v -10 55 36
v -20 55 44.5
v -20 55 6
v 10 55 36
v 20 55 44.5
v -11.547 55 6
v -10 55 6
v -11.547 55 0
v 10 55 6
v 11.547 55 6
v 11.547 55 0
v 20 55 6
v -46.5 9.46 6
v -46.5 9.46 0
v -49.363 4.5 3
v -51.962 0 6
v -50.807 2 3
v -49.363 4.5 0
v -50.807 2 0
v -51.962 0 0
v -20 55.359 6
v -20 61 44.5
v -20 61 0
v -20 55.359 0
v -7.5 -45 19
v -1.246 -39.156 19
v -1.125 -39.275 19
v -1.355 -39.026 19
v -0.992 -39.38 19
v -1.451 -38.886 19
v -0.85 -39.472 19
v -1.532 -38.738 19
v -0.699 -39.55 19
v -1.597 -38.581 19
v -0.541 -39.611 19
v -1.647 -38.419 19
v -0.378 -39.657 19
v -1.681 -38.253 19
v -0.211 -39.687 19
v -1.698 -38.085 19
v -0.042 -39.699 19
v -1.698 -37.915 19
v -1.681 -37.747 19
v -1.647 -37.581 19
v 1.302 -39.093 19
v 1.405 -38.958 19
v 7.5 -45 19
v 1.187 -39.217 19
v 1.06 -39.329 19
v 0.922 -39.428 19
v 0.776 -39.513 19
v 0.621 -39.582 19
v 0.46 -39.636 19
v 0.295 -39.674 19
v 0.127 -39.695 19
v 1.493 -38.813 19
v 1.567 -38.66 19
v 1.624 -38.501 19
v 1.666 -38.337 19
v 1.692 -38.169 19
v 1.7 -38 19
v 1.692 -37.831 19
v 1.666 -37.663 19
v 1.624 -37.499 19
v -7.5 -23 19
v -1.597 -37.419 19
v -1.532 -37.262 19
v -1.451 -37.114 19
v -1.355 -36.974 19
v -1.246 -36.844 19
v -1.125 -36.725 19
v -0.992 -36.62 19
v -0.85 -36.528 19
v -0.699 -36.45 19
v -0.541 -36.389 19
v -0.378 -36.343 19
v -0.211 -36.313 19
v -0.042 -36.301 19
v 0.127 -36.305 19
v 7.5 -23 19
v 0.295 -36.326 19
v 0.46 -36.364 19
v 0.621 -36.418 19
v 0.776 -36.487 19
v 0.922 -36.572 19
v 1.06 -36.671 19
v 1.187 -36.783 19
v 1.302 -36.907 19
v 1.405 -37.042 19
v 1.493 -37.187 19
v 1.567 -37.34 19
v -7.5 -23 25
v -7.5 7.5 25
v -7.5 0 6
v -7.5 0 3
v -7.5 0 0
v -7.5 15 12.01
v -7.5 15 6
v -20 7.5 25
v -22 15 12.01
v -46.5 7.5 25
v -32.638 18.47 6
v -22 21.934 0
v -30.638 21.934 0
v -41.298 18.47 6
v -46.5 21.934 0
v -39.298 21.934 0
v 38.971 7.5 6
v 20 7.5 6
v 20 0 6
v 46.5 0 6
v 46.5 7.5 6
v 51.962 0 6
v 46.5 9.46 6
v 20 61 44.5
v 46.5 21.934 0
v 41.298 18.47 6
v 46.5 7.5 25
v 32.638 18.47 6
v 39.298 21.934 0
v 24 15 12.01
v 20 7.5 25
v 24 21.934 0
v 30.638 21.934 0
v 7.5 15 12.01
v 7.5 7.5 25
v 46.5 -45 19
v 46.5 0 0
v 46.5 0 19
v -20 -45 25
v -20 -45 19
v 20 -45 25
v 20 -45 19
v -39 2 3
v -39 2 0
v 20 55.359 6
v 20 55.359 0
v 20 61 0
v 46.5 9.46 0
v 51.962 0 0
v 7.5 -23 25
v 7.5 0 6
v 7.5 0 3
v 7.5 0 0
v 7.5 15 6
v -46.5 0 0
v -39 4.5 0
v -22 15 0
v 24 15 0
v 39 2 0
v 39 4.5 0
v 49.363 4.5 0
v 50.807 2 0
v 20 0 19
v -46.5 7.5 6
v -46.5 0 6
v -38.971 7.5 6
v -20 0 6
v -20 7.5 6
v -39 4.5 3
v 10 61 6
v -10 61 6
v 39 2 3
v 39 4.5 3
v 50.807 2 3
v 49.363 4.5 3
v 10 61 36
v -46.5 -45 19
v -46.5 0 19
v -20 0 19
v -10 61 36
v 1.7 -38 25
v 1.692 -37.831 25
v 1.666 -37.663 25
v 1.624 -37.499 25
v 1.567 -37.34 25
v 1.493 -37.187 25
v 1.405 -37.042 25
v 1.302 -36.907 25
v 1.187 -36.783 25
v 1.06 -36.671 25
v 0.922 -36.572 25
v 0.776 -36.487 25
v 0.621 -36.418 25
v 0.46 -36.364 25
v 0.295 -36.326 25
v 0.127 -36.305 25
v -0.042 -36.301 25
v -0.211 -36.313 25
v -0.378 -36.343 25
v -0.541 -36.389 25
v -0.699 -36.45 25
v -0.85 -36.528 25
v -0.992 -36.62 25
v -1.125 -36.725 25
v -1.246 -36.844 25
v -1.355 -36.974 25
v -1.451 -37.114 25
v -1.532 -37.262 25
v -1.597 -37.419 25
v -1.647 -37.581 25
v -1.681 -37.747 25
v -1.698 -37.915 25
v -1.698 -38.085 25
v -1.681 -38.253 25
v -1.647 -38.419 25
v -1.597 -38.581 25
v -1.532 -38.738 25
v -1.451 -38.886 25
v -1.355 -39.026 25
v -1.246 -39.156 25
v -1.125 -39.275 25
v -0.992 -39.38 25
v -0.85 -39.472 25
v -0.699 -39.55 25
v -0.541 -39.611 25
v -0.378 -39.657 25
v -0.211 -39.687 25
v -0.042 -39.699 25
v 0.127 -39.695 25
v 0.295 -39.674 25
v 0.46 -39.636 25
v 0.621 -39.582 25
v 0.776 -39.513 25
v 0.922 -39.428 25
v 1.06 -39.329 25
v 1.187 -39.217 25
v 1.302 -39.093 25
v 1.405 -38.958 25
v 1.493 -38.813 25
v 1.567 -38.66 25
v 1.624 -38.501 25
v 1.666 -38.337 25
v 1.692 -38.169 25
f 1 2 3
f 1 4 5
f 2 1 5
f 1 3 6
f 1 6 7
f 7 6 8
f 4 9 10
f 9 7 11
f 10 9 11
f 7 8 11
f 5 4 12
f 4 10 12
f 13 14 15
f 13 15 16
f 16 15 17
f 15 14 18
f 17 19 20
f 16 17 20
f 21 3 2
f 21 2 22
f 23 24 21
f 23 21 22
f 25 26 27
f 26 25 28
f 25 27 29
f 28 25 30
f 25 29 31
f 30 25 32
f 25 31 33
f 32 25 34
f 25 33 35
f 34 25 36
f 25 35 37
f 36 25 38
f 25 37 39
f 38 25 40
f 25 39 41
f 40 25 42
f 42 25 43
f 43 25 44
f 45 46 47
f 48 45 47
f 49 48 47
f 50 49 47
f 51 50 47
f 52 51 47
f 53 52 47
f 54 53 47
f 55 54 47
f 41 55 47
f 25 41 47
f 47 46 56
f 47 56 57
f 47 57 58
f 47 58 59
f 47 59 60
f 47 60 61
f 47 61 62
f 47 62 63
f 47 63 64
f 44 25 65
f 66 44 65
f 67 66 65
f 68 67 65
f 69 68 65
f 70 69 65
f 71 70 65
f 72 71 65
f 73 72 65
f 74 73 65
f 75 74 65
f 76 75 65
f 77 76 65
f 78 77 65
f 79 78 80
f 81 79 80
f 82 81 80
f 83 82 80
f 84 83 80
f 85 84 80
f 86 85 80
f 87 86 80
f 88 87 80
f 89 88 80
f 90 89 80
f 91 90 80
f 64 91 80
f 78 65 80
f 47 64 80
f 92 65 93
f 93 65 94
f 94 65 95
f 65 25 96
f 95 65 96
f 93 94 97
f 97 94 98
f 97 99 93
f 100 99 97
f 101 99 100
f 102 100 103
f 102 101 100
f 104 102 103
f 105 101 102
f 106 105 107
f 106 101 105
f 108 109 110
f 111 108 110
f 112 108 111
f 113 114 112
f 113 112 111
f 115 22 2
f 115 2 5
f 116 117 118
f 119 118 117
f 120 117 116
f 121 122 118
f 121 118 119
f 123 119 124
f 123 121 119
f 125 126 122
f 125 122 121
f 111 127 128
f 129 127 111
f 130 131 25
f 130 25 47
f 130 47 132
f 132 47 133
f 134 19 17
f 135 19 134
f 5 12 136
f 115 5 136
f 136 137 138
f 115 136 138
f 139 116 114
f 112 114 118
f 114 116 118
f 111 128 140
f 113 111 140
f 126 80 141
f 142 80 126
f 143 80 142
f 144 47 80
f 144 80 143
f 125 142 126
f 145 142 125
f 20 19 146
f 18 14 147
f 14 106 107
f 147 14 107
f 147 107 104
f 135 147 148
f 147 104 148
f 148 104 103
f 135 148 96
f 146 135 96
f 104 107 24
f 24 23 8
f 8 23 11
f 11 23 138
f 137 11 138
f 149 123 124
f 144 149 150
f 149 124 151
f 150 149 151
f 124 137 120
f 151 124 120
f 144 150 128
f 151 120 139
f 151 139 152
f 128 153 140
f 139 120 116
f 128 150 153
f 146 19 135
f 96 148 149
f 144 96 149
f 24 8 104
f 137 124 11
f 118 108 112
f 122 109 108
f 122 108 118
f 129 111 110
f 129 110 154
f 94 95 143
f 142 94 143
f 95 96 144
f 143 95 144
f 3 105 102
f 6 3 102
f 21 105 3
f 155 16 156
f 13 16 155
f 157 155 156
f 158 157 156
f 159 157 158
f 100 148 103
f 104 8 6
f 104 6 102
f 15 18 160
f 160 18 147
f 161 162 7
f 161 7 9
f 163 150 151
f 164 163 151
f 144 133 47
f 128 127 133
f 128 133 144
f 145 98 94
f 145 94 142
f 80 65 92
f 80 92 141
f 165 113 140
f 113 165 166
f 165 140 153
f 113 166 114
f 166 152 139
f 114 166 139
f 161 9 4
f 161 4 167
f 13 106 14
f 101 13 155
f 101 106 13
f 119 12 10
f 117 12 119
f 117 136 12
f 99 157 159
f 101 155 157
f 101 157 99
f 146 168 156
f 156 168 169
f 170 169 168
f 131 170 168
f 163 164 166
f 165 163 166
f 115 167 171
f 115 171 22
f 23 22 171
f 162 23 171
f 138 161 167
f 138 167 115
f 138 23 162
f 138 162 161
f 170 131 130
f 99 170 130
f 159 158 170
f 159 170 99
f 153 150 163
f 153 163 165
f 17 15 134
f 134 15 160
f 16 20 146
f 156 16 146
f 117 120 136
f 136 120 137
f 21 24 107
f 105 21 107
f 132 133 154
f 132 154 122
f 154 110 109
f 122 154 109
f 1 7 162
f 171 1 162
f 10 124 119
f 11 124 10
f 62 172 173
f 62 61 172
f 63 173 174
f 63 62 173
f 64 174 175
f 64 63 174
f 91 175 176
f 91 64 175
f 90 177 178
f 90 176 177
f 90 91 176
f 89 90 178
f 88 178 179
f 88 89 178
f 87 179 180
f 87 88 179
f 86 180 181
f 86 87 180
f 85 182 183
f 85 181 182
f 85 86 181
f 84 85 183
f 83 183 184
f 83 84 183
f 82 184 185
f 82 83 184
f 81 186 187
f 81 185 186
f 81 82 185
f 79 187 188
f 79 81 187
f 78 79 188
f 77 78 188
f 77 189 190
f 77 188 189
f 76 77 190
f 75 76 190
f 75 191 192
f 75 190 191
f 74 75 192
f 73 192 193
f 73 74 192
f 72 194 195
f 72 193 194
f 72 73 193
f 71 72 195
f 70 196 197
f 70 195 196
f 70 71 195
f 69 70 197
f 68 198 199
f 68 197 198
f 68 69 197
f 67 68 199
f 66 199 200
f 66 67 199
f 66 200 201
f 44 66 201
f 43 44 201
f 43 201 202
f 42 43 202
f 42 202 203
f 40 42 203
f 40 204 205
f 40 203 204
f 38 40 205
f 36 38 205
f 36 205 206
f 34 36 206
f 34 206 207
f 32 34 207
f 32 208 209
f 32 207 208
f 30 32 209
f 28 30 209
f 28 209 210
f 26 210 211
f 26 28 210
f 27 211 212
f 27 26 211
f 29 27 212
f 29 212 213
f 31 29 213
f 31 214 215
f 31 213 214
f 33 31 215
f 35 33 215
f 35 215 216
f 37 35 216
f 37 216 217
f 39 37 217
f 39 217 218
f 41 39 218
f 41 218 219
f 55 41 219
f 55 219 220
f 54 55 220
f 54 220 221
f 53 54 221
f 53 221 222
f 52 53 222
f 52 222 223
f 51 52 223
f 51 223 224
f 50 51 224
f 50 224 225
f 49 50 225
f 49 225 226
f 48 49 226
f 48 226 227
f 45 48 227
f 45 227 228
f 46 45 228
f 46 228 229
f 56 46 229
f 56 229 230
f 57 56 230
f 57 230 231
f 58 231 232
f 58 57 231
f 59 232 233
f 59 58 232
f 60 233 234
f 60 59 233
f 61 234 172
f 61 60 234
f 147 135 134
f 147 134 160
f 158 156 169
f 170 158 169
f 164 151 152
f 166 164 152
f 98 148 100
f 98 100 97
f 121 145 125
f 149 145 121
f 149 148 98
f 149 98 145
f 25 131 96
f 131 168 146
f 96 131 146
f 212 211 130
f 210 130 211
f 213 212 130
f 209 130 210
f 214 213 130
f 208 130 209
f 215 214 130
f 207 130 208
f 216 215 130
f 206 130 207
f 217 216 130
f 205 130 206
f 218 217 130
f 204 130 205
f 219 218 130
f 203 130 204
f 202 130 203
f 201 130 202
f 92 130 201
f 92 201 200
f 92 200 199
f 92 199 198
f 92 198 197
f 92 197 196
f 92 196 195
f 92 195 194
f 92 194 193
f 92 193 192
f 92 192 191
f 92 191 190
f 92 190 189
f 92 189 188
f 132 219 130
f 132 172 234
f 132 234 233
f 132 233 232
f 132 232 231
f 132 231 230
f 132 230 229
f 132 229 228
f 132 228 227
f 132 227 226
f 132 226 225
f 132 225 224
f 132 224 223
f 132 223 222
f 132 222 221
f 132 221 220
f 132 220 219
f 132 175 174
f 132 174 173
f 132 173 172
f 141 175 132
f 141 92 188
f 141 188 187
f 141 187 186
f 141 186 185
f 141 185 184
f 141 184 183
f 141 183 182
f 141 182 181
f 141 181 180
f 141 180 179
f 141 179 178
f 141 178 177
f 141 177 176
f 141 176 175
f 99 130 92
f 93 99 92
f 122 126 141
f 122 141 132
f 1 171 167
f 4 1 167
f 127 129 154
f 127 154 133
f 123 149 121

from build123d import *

# Parameters (mm, degrees)
BOX031_W                 = 46
BOX031_H                 = 15
BOX031_DEPTH             = 16
BOX029_W                 = 78
BOX029_H                 = 15
BOX029_DEPTH             = 6
BOX023_W                 = 220
BOX023_H                 = 2.5
BOX023_DEPTH             = 3
EXTRUDE011_DEPTH         = 10
BOX024_W                 = 220
BOX024_H                 = 113
BOX024_DEPTH             = 8
BOX026_W                 = 32
BOX026_H                 = 6
BOX026_DEPTH             = 6
PRISM004_DEPTH           = 6
PRISM004_PLACEMENT_ANGLE = 30
PRISM005_DEPTH           = 6
PRISM005_PLACEMENT_ANGLE = 30
EXTRUDE012_DEPTH         = 39
EXTRUDE009_DEPTH         = 39
EXTRUDE008_DEPTH         = 39
BOX009_W                 = 12.5
BOX009_H                 = 7.5
BOX009_DEPTH             = 22
BOX010_W                 = 12.5
BOX010_H                 = 7.5
BOX010_DEPTH             = 22
CYLINDER_R               = 1.7
CYLINDER_DEPTH           = 30
BOX007_W                 = 15
BOX007_H                 = 70
BOX007_DEPTH             = 6
BOX006_W                 = 40
BOX006_H                 = 51
BOX006_DEPTH             = 6
EXTRUDE010_DEPTH         = 39
BOX021_W                 = 12.5
BOX021_H                 = 7.5
BOX021_DEPTH             = 22
BOX027_W                 = 12.5
BOX027_H                 = 7.5
BOX027_DEPTH             = 22
CYLINDER002_R            = 1.7
CYLINDER002_DEPTH        = 30
BOX025_W                 = 15
BOX025_H                 = 70
BOX025_DEPTH             = 6
BOX022_W                 = 40
BOX022_H                 = 51
BOX022_DEPTH             = 6
BOX005_W                 = 20
BOX005_H                 = 6
BOX005_DEPTH             = 30
BOX004_W                 = 40
BOX004_H                 = 6
BOX004_DEPTH             = 44.5


with BuildPart() as cube030:
    # Box031 → Box031 (new body)
    with BuildSketch(Plane(origin=(-22, 15, 0), x_dir=(1, 0, 0), z_dir=(0, 0, 1))):
        with Locations((23, 7.5)):
            Rectangle(BOX031_W, BOX031_H)
    extrude(amount=BOX031_DEPTH)


with BuildPart() as cube028:
    # Box029 → Box029 (new body)
    with BuildSketch(Plane(origin=(-39, 0, 0), x_dir=(1, 0, 0), z_dir=(0, 0, 1))):
        with Locations((39, 7.5)):
            Rectangle(BOX029_W, BOX029_H)
    extrude(amount=BOX029_DEPTH)


with BuildPart() as cube022:
    # Box023 → Box023 (new body)
    with BuildSketch(Plane(origin=(-110, 2, 0), x_dir=(1, 0, 0), z_dir=(0, 0, 1))):
        with Locations((110, 1.25)):
            Rectangle(BOX023_W, BOX023_H)
    extrude(amount=BOX023_DEPTH)


with BuildPart() as extrude011:
    # Sketch009 → Extrude011 (new body)
    with BuildSketch(Plane.XY):
        Polygon((-95, 0), (95, 0), (85, 61), (-85, 61), align=None)
    extrude(amount=EXTRUDE011_DEPTH)


with BuildPart() as molde_cortador002:
    # Box024 → Box024 (new body)
    with BuildSketch(Plane(origin=(-110, -15, 0), x_dir=(1, 0, 0), z_dir=(0, 0, 1))):
        with Locations((110, 56.5)):
            Rectangle(BOX024_W, BOX024_H)
    extrude(amount=BOX024_DEPTH)

    # Cut004020: cut Extrude011
    add(extrude011.part, mode=Mode.SUBTRACT)


with BuildPart() as cube025:
    # Box026 → Box026 (new body)
    with BuildSketch(Plane(origin=(-16, 55, 0), x_dir=(1, 0, 0), z_dir=(0, 0, 1))):
        with Locations((16, 3)):
            Rectangle(BOX026_W, BOX026_H)
    extrude(amount=BOX026_DEPTH)


with BuildPart() as prism004:
    # Prism004 → Prism004 (new body)
    with BuildSketch(Plane.XY):
        Polygon((45, 0), (-22.5, 38.971143), (-22.5, -38.971143), align=None)
    extrude(amount=PRISM004_DEPTH)


with BuildPart() as prism004_1:
    # Prism004 placement: moved
    add(prism004.part.moved(Location((0, 23, 0))).rotate(Axis((0, 23, 0), (0, 0, -1)), PRISM004_PLACEMENT_ANGLE))


with BuildPart() as base_triangulo_con_canaleta001:
    # Prism005 → Prism005 (new body)
    with BuildSketch(Plane.XY):
        Polygon((60, 0), (-30, 51.961524), (-30, -51.961524), align=None)
    extrude(amount=PRISM005_DEPTH)


with BuildPart() as base_triangulo_con_canaleta001_1:
    # Prism005 placement: moved
    add(base_triangulo_con_canaleta001.part.moved(Location((0, 23, 0))).rotate(Axis((0, 23, 0), (0, 0, -1)), PRISM005_PLACEMENT_ANGLE))

    # Cut004019: cut Prism004
    add(prism004_1.part, mode=Mode.SUBTRACT)


with BuildPart() as base_triangulo_con_canaleta001_2:
    # Cut004019 placement: moved
    add(base_triangulo_con_canaleta001_1.part.moved(Location((0, 7, 0))))

    # Fusion004005: union Cube025
    add(cube025.part)

    # Cut004015: cut molde_cortador002
    add(molde_cortador002.part, mode=Mode.SUBTRACT)

    # Cut004016: cut Cube022
    add(cube022.part, mode=Mode.SUBTRACT)


with BuildPart() as extrude012:
    # Sketch010 (on Face21 of Fusion004006) → Extrude012 (new body)
    with BuildSketch(Plane(origin=(-20, 0, 0), x_dir=(0, -1, 0), z_dir=(-1, 0, 0))):
        Polygon((-7.5, 0), (-7.5, 25), (-21.933757, 0), align=None)
    extrude(amount=-EXTRUDE012_DEPTH)


with BuildPart() as extrude012_1:
    # Extrude012 placement: moved
    add(extrude012.part.moved(Location((27.5, 0, 0))))


with BuildPart() as extrude009:
    # Sketch007 (on Face17 of Fusion004002) → Extrude009 (new body)
    with BuildSketch(Plane(origin=(-20, 0, 0), x_dir=(0, -1, 0), z_dir=(-1, 0, 0))):
        Polygon((0, 0), (0, 19), (45, 19), align=None)
    extrude(amount=EXTRUDE009_DEPTH)


with BuildPart() as extrude009_1:
    # Extrude009 placement: moved
    add(extrude009.part.moved(Location((66.5, 0, 0))))


with BuildPart() as extrude008:
    # Sketch007 (on Face17 of Fusion004002) → Extrude008 (new body)
    with BuildSketch(Plane(origin=(-20, 0, 0), x_dir=(0, -1, 0), z_dir=(-1, 0, 0))):
        Polygon((0, 0), (0, 19), (45, 19), align=None)
    extrude(amount=-EXTRUDE008_DEPTH)


with BuildPart() as extrude008_1:
    # Extrude008 placement: moved
    add(extrude008.part.moved(Location((-26.5, 0, 0))))


with BuildPart() as cube008:
    # Box009 → Box009 (new body)
    with BuildSketch(Plane(origin=(7.5, 0, 3), x_dir=(1, 0, 0), z_dir=(0, 0, 1))):
        with Locations((6.25, 3.75)):
            Rectangle(BOX009_W, BOX009_H)
    extrude(amount=BOX009_DEPTH)


with BuildPart() as cube009:
    # Box010 → Box010 (new body)
    with BuildSketch(Plane(origin=(-20, 0, 3), x_dir=(1, 0, 0), z_dir=(0, 0, 1))):
        with Locations((6.25, 3.75)):
            Rectangle(BOX010_W, BOX010_H)
    extrude(amount=BOX010_DEPTH)


with BuildPart() as cylinder:
    # Cylinder → Cylinder (new body)
    with BuildSketch(Plane(origin=(0, 7, 0), x_dir=(1, 0, 0), z_dir=(0, 0, 1))):
        Circle(CYLINDER_R)
    extrude(amount=CYLINDER_DEPTH)


with BuildPart() as cube007:
    # Box007 → Box007 (new body)
    with BuildSketch(Plane(origin=(12.5, 22, 20), x_dir=(1, 0, 0), z_dir=(0, 0, 1))):
        with Locations((7.5, 35)):
            Rectangle(BOX007_W, BOX007_H)
    extrude(amount=BOX007_DEPTH)


with BuildPart() as fusion004002:
    # Box006 → Box006 (new body)
    with BuildSketch(Plane.XY.offset(20)):
        with Locations((20, 25.5)):
            Rectangle(BOX006_W, BOX006_H)
    extrude(amount=BOX006_DEPTH)

    # Cut004005: cut Cube007
    add(cube007.part, mode=Mode.SUBTRACT)


with BuildPart() as fusion004002_1:
    # Cut004005 placement: moved
    add(fusion004002.part.moved(Location((-20, 0, -1))))

    # Cut004006: cut Cylinder
    add(cylinder.part, mode=Mode.SUBTRACT)


with BuildPart() as fusion004002_2:
    # Cut004006 placement: moved
    add(fusion004002_1.part.moved(Location((0, -45, 0))))

    # Fusion004002: union Cube008, Cube009
    add(cube008.part)
    add(cube009.part)


with BuildPart() as fusion004007:
    # Sketch008 (on Face21 of Fusion004002) → Extrude010 (new body)
    with BuildSketch(Plane(origin=(-20, 0, 0), x_dir=(0, -1, 0), z_dir=(-1, 0, 0))):
        Polygon((-7.5, 0), (-7.5, 25), (-21.933757, 0), align=None)
    extrude(amount=-EXTRUDE010_DEPTH)


with BuildPart() as fusion004007_1:
    # Extrude010 placement: moved
    add(fusion004007.part.moved(Location((-26.5, 0, 0))))

    # Fusion004007: union Extrude012, Extrude009, Extrude008, Fusion004002
    add(extrude012_1.part)
    add(extrude009_1.part)
    add(extrude008_1.part)
    add(fusion004002_2.part)


with BuildPart() as cube020:
    # Box021 → Box021 (new body)
    with BuildSketch(Plane(origin=(7.5, 0, 3), x_dir=(1, 0, 0), z_dir=(0, 0, 1))):
        with Locations((6.25, 3.75)):
            Rectangle(BOX021_W, BOX021_H)
    extrude(amount=BOX021_DEPTH)


with BuildPart() as cube026:
    # Box027 → Box027 (new body)
    with BuildSketch(Plane(origin=(-20, 0, 3), x_dir=(1, 0, 0), z_dir=(0, 0, 1))):
        with Locations((6.25, 3.75)):
            Rectangle(BOX027_W, BOX027_H)
    extrude(amount=BOX027_DEPTH)


with BuildPart() as cylinder002:
    # Cylinder002 → Cylinder002 (new body)
    with BuildSketch(Plane(origin=(0, 7, 0), x_dir=(1, 0, 0), z_dir=(0, 0, 1))):
        Circle(CYLINDER002_R)
    extrude(amount=CYLINDER002_DEPTH)


with BuildPart() as cube024:
    # Box025 → Box025 (new body)
    with BuildSketch(Plane(origin=(12.5, 22, 20), x_dir=(1, 0, 0), z_dir=(0, 0, 1))):
        with Locations((7.5, 35)):
            Rectangle(BOX025_W, BOX025_H)
    extrude(amount=BOX025_DEPTH)


with BuildPart() as parte_frontal:
    # Box022 → Box022 (new body)
    with BuildSketch(Plane.XY.offset(20)):
        with Locations((20, 25.5)):
            Rectangle(BOX022_W, BOX022_H)
    extrude(amount=BOX022_DEPTH)

    # Cut004017: cut Cube024
    add(cube024.part, mode=Mode.SUBTRACT)


with BuildPart() as parte_frontal_1:
    # Cut004017 placement: moved
    add(parte_frontal.part.moved(Location((-20, 0, -1))))

    # Cut004018: cut Cylinder002
    add(cylinder002.part, mode=Mode.SUBTRACT)


with BuildPart() as parte_frontal_2:
    # Cut004018 placement: moved
    add(parte_frontal_1.part.moved(Location((0, -45, 0))))

    # Fusion004006: union Cube020, Cube026
    add(cube020.part)
    add(cube026.part)

    # Fusion004008: union Fusion004007
    add(fusion004007_1.part)


with BuildPart() as cube005:
    # Box005 → Box005 (new body)
    with BuildSketch(Plane(origin=(-10, 55, 6), x_dir=(1, 0, 0), z_dir=(0, 0, 1))):
        with Locations((10, 3)):
            Rectangle(BOX005_W, BOX005_H)
    extrude(amount=BOX005_DEPTH)


with BuildPart() as cut004022:
    # Box004 → Box004 (new body)
    with BuildSketch(Plane(origin=(-20, 55, 0), x_dir=(1, 0, 0), z_dir=(0, 0, 1))):
        with Locations((20, 3)):
            Rectangle(BOX004_W, BOX004_H)
    extrude(amount=BOX004_DEPTH)

    # Cut004004: cut Cube005
    add(cube005.part, mode=Mode.SUBTRACT)

    # Fusion004009: union base_triangulo_con_canaleta001, parte_frontal
    add(base_triangulo_con_canaleta001_2.part)
    add(parte_frontal_2.part)

    # Fusion004009002: union Cube028
    add(cube028.part)

    # Cut004022: cut Cube030
    add(cube030.part, mode=Mode.SUBTRACT)


solid = cut004022.part
